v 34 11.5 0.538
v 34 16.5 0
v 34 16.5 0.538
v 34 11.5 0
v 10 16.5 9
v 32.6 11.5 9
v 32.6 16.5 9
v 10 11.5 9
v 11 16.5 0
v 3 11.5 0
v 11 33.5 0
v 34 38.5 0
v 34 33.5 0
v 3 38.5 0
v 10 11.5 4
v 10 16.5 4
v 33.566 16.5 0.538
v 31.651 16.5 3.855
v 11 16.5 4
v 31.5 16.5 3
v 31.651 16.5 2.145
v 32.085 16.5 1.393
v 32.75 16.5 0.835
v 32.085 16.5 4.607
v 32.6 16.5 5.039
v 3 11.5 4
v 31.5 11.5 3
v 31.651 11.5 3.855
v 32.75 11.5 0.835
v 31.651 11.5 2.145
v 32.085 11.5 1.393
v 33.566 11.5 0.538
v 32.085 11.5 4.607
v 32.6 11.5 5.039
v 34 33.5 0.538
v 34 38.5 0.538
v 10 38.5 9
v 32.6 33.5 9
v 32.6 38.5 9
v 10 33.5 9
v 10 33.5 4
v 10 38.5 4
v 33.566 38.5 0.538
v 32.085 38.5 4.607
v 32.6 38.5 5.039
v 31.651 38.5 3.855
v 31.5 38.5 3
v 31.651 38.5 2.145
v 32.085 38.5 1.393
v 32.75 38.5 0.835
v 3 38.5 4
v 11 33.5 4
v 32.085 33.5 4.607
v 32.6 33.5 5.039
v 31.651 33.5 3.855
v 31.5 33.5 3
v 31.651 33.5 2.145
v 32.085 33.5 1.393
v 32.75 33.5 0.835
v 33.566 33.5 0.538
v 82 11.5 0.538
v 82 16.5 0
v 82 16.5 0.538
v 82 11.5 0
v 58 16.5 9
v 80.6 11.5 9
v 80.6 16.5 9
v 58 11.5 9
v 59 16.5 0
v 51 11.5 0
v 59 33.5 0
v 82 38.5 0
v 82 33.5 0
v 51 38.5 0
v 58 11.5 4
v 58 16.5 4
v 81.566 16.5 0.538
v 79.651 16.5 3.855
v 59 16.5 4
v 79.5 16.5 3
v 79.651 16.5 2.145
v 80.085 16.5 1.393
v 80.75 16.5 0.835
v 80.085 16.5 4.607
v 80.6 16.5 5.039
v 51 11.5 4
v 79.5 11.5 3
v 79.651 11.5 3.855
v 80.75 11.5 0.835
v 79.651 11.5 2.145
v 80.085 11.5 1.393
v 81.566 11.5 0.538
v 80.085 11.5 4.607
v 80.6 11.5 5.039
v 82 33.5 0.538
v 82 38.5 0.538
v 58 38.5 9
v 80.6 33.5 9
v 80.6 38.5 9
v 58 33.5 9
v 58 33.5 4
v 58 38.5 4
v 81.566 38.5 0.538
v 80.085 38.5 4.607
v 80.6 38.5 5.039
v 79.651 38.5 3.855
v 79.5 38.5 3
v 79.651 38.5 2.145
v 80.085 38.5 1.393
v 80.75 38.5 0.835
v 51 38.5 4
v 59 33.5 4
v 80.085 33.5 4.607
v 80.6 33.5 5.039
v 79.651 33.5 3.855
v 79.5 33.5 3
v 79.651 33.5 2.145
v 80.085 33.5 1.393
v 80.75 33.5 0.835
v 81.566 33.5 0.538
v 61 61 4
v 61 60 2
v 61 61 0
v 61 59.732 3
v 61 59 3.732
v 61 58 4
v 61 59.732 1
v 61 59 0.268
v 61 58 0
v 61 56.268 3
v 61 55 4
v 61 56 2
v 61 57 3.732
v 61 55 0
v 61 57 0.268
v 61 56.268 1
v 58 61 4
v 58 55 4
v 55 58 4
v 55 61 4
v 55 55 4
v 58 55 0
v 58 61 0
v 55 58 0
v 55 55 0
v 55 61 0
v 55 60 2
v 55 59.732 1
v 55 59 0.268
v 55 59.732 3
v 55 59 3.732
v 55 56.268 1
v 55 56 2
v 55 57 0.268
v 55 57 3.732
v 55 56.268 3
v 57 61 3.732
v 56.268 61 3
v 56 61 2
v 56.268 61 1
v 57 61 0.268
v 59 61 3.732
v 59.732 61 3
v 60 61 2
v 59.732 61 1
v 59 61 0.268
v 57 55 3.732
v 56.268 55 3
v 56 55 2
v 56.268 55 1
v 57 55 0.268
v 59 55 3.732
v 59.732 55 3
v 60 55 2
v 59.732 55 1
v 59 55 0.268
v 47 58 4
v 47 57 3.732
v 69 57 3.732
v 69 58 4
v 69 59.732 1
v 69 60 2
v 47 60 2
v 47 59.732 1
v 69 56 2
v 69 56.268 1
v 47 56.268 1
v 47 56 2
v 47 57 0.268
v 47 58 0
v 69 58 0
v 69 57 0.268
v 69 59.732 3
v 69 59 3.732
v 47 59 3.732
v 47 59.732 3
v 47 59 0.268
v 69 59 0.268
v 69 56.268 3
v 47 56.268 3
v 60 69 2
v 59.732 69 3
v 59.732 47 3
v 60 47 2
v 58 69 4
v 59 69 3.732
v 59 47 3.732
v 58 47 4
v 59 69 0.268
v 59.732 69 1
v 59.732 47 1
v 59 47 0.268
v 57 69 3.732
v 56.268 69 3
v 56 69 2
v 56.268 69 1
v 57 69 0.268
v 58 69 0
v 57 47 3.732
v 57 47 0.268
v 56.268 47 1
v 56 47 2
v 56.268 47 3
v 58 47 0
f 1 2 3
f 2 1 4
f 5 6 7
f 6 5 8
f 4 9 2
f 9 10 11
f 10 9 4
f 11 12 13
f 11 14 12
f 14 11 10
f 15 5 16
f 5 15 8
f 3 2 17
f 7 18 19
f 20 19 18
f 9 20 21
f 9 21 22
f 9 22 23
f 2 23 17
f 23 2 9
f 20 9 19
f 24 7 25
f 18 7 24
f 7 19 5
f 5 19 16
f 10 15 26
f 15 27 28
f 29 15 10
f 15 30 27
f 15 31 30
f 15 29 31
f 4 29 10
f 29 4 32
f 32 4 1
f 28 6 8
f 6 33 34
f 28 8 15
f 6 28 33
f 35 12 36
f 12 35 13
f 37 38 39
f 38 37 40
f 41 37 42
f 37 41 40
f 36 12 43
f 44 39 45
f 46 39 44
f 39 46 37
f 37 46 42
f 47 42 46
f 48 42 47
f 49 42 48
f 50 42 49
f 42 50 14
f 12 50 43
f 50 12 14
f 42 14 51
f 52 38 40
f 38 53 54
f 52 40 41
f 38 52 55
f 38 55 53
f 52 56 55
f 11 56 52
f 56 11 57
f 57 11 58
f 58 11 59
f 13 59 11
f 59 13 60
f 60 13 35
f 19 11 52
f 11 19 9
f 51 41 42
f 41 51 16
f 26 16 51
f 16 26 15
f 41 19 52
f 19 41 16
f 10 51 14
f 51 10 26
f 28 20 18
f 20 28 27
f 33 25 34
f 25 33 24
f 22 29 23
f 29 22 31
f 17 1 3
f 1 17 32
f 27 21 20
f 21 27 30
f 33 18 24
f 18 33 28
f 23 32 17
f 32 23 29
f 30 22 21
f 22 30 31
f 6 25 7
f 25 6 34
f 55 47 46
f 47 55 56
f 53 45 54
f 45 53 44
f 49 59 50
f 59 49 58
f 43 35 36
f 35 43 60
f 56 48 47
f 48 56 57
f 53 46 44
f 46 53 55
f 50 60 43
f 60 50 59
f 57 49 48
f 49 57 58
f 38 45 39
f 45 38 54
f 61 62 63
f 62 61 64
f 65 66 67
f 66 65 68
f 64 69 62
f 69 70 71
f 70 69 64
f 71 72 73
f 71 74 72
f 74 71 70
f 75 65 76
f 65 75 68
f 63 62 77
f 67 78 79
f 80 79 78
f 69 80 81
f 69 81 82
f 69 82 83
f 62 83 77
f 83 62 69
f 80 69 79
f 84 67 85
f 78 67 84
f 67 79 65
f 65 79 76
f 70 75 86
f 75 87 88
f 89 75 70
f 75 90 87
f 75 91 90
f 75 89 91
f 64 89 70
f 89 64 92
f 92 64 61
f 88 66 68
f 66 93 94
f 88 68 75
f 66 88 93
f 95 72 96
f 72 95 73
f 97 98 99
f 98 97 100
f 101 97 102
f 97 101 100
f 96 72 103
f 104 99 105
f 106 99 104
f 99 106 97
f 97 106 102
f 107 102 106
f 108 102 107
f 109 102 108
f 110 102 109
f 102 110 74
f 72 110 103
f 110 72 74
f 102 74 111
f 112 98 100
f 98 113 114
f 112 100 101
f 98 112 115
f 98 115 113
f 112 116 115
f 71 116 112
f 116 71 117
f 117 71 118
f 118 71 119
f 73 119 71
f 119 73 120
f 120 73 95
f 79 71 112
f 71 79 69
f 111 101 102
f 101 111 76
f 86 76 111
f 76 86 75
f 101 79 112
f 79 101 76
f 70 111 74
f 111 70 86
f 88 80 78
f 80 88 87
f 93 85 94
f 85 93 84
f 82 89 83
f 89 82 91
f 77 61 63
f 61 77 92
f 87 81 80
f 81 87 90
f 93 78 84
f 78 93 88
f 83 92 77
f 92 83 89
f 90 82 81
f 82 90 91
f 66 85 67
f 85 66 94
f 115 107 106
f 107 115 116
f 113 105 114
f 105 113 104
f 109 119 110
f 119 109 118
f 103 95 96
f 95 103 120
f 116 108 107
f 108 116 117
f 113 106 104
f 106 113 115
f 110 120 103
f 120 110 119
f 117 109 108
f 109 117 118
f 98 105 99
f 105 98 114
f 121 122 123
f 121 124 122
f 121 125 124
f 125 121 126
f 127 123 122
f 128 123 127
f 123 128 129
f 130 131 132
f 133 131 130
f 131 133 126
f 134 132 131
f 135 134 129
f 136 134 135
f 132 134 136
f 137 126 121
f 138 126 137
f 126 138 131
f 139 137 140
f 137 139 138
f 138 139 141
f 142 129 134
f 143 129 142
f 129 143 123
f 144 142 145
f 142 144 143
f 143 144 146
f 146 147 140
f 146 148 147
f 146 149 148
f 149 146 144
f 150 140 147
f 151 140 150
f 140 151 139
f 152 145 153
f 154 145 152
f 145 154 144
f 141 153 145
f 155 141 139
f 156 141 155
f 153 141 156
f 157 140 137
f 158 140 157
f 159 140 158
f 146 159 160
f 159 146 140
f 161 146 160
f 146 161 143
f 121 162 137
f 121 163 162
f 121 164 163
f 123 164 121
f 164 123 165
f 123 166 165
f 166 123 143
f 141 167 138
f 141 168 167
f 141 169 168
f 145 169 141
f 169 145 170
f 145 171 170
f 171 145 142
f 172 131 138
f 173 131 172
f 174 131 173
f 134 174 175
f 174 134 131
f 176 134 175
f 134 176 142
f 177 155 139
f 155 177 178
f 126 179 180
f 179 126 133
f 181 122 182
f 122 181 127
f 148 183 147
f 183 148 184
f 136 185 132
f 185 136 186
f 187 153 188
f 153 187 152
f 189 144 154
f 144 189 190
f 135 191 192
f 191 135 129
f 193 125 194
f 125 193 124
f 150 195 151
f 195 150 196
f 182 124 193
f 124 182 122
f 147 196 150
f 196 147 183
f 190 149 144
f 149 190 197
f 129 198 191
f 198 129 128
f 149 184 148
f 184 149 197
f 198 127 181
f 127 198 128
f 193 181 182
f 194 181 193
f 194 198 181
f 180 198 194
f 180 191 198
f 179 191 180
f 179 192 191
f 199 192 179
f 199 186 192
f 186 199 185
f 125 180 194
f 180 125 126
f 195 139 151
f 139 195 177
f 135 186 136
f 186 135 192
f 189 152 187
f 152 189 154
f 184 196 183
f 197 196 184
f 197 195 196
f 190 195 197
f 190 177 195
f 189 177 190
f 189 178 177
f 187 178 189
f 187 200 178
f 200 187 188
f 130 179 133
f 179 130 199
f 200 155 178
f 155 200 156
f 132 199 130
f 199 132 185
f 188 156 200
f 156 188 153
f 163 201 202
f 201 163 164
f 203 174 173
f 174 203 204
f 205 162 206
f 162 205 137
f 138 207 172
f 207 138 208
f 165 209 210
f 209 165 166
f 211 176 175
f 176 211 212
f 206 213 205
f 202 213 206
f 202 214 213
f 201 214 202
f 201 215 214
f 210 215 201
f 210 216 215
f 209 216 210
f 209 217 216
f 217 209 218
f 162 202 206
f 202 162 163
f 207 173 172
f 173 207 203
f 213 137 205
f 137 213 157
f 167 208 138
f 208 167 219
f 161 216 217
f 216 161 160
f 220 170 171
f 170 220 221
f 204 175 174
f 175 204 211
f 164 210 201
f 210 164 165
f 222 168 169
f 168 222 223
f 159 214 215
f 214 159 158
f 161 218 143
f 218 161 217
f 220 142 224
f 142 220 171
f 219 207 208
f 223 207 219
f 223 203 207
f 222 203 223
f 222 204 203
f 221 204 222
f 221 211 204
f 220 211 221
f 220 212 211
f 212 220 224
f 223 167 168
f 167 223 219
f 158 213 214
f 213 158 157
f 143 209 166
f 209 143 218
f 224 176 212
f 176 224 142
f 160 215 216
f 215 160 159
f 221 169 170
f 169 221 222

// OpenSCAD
/*
Sample 020: Schnapp-Kardangelenk — großzügig
Generated from the FDM Mechanical Sample Library.
Units: millimetres.

Override examples:
  openscad -o custom.stl -D 'view="plate"' -D 'render_fn=64' model.scad
  openscad -o preview.png -D 'view="assembly"' model.scad
*/
use <../../../library/fdm_mechanisms.scad>

render_fn = is_undef(render_fn) ? 48 : render_fn;
view = is_undef(view) ? "plate" : view;
$fn = render_fn;

sample_universal_joint(
    view=view,
    clearance=0.5,
    pin_d=4
);
